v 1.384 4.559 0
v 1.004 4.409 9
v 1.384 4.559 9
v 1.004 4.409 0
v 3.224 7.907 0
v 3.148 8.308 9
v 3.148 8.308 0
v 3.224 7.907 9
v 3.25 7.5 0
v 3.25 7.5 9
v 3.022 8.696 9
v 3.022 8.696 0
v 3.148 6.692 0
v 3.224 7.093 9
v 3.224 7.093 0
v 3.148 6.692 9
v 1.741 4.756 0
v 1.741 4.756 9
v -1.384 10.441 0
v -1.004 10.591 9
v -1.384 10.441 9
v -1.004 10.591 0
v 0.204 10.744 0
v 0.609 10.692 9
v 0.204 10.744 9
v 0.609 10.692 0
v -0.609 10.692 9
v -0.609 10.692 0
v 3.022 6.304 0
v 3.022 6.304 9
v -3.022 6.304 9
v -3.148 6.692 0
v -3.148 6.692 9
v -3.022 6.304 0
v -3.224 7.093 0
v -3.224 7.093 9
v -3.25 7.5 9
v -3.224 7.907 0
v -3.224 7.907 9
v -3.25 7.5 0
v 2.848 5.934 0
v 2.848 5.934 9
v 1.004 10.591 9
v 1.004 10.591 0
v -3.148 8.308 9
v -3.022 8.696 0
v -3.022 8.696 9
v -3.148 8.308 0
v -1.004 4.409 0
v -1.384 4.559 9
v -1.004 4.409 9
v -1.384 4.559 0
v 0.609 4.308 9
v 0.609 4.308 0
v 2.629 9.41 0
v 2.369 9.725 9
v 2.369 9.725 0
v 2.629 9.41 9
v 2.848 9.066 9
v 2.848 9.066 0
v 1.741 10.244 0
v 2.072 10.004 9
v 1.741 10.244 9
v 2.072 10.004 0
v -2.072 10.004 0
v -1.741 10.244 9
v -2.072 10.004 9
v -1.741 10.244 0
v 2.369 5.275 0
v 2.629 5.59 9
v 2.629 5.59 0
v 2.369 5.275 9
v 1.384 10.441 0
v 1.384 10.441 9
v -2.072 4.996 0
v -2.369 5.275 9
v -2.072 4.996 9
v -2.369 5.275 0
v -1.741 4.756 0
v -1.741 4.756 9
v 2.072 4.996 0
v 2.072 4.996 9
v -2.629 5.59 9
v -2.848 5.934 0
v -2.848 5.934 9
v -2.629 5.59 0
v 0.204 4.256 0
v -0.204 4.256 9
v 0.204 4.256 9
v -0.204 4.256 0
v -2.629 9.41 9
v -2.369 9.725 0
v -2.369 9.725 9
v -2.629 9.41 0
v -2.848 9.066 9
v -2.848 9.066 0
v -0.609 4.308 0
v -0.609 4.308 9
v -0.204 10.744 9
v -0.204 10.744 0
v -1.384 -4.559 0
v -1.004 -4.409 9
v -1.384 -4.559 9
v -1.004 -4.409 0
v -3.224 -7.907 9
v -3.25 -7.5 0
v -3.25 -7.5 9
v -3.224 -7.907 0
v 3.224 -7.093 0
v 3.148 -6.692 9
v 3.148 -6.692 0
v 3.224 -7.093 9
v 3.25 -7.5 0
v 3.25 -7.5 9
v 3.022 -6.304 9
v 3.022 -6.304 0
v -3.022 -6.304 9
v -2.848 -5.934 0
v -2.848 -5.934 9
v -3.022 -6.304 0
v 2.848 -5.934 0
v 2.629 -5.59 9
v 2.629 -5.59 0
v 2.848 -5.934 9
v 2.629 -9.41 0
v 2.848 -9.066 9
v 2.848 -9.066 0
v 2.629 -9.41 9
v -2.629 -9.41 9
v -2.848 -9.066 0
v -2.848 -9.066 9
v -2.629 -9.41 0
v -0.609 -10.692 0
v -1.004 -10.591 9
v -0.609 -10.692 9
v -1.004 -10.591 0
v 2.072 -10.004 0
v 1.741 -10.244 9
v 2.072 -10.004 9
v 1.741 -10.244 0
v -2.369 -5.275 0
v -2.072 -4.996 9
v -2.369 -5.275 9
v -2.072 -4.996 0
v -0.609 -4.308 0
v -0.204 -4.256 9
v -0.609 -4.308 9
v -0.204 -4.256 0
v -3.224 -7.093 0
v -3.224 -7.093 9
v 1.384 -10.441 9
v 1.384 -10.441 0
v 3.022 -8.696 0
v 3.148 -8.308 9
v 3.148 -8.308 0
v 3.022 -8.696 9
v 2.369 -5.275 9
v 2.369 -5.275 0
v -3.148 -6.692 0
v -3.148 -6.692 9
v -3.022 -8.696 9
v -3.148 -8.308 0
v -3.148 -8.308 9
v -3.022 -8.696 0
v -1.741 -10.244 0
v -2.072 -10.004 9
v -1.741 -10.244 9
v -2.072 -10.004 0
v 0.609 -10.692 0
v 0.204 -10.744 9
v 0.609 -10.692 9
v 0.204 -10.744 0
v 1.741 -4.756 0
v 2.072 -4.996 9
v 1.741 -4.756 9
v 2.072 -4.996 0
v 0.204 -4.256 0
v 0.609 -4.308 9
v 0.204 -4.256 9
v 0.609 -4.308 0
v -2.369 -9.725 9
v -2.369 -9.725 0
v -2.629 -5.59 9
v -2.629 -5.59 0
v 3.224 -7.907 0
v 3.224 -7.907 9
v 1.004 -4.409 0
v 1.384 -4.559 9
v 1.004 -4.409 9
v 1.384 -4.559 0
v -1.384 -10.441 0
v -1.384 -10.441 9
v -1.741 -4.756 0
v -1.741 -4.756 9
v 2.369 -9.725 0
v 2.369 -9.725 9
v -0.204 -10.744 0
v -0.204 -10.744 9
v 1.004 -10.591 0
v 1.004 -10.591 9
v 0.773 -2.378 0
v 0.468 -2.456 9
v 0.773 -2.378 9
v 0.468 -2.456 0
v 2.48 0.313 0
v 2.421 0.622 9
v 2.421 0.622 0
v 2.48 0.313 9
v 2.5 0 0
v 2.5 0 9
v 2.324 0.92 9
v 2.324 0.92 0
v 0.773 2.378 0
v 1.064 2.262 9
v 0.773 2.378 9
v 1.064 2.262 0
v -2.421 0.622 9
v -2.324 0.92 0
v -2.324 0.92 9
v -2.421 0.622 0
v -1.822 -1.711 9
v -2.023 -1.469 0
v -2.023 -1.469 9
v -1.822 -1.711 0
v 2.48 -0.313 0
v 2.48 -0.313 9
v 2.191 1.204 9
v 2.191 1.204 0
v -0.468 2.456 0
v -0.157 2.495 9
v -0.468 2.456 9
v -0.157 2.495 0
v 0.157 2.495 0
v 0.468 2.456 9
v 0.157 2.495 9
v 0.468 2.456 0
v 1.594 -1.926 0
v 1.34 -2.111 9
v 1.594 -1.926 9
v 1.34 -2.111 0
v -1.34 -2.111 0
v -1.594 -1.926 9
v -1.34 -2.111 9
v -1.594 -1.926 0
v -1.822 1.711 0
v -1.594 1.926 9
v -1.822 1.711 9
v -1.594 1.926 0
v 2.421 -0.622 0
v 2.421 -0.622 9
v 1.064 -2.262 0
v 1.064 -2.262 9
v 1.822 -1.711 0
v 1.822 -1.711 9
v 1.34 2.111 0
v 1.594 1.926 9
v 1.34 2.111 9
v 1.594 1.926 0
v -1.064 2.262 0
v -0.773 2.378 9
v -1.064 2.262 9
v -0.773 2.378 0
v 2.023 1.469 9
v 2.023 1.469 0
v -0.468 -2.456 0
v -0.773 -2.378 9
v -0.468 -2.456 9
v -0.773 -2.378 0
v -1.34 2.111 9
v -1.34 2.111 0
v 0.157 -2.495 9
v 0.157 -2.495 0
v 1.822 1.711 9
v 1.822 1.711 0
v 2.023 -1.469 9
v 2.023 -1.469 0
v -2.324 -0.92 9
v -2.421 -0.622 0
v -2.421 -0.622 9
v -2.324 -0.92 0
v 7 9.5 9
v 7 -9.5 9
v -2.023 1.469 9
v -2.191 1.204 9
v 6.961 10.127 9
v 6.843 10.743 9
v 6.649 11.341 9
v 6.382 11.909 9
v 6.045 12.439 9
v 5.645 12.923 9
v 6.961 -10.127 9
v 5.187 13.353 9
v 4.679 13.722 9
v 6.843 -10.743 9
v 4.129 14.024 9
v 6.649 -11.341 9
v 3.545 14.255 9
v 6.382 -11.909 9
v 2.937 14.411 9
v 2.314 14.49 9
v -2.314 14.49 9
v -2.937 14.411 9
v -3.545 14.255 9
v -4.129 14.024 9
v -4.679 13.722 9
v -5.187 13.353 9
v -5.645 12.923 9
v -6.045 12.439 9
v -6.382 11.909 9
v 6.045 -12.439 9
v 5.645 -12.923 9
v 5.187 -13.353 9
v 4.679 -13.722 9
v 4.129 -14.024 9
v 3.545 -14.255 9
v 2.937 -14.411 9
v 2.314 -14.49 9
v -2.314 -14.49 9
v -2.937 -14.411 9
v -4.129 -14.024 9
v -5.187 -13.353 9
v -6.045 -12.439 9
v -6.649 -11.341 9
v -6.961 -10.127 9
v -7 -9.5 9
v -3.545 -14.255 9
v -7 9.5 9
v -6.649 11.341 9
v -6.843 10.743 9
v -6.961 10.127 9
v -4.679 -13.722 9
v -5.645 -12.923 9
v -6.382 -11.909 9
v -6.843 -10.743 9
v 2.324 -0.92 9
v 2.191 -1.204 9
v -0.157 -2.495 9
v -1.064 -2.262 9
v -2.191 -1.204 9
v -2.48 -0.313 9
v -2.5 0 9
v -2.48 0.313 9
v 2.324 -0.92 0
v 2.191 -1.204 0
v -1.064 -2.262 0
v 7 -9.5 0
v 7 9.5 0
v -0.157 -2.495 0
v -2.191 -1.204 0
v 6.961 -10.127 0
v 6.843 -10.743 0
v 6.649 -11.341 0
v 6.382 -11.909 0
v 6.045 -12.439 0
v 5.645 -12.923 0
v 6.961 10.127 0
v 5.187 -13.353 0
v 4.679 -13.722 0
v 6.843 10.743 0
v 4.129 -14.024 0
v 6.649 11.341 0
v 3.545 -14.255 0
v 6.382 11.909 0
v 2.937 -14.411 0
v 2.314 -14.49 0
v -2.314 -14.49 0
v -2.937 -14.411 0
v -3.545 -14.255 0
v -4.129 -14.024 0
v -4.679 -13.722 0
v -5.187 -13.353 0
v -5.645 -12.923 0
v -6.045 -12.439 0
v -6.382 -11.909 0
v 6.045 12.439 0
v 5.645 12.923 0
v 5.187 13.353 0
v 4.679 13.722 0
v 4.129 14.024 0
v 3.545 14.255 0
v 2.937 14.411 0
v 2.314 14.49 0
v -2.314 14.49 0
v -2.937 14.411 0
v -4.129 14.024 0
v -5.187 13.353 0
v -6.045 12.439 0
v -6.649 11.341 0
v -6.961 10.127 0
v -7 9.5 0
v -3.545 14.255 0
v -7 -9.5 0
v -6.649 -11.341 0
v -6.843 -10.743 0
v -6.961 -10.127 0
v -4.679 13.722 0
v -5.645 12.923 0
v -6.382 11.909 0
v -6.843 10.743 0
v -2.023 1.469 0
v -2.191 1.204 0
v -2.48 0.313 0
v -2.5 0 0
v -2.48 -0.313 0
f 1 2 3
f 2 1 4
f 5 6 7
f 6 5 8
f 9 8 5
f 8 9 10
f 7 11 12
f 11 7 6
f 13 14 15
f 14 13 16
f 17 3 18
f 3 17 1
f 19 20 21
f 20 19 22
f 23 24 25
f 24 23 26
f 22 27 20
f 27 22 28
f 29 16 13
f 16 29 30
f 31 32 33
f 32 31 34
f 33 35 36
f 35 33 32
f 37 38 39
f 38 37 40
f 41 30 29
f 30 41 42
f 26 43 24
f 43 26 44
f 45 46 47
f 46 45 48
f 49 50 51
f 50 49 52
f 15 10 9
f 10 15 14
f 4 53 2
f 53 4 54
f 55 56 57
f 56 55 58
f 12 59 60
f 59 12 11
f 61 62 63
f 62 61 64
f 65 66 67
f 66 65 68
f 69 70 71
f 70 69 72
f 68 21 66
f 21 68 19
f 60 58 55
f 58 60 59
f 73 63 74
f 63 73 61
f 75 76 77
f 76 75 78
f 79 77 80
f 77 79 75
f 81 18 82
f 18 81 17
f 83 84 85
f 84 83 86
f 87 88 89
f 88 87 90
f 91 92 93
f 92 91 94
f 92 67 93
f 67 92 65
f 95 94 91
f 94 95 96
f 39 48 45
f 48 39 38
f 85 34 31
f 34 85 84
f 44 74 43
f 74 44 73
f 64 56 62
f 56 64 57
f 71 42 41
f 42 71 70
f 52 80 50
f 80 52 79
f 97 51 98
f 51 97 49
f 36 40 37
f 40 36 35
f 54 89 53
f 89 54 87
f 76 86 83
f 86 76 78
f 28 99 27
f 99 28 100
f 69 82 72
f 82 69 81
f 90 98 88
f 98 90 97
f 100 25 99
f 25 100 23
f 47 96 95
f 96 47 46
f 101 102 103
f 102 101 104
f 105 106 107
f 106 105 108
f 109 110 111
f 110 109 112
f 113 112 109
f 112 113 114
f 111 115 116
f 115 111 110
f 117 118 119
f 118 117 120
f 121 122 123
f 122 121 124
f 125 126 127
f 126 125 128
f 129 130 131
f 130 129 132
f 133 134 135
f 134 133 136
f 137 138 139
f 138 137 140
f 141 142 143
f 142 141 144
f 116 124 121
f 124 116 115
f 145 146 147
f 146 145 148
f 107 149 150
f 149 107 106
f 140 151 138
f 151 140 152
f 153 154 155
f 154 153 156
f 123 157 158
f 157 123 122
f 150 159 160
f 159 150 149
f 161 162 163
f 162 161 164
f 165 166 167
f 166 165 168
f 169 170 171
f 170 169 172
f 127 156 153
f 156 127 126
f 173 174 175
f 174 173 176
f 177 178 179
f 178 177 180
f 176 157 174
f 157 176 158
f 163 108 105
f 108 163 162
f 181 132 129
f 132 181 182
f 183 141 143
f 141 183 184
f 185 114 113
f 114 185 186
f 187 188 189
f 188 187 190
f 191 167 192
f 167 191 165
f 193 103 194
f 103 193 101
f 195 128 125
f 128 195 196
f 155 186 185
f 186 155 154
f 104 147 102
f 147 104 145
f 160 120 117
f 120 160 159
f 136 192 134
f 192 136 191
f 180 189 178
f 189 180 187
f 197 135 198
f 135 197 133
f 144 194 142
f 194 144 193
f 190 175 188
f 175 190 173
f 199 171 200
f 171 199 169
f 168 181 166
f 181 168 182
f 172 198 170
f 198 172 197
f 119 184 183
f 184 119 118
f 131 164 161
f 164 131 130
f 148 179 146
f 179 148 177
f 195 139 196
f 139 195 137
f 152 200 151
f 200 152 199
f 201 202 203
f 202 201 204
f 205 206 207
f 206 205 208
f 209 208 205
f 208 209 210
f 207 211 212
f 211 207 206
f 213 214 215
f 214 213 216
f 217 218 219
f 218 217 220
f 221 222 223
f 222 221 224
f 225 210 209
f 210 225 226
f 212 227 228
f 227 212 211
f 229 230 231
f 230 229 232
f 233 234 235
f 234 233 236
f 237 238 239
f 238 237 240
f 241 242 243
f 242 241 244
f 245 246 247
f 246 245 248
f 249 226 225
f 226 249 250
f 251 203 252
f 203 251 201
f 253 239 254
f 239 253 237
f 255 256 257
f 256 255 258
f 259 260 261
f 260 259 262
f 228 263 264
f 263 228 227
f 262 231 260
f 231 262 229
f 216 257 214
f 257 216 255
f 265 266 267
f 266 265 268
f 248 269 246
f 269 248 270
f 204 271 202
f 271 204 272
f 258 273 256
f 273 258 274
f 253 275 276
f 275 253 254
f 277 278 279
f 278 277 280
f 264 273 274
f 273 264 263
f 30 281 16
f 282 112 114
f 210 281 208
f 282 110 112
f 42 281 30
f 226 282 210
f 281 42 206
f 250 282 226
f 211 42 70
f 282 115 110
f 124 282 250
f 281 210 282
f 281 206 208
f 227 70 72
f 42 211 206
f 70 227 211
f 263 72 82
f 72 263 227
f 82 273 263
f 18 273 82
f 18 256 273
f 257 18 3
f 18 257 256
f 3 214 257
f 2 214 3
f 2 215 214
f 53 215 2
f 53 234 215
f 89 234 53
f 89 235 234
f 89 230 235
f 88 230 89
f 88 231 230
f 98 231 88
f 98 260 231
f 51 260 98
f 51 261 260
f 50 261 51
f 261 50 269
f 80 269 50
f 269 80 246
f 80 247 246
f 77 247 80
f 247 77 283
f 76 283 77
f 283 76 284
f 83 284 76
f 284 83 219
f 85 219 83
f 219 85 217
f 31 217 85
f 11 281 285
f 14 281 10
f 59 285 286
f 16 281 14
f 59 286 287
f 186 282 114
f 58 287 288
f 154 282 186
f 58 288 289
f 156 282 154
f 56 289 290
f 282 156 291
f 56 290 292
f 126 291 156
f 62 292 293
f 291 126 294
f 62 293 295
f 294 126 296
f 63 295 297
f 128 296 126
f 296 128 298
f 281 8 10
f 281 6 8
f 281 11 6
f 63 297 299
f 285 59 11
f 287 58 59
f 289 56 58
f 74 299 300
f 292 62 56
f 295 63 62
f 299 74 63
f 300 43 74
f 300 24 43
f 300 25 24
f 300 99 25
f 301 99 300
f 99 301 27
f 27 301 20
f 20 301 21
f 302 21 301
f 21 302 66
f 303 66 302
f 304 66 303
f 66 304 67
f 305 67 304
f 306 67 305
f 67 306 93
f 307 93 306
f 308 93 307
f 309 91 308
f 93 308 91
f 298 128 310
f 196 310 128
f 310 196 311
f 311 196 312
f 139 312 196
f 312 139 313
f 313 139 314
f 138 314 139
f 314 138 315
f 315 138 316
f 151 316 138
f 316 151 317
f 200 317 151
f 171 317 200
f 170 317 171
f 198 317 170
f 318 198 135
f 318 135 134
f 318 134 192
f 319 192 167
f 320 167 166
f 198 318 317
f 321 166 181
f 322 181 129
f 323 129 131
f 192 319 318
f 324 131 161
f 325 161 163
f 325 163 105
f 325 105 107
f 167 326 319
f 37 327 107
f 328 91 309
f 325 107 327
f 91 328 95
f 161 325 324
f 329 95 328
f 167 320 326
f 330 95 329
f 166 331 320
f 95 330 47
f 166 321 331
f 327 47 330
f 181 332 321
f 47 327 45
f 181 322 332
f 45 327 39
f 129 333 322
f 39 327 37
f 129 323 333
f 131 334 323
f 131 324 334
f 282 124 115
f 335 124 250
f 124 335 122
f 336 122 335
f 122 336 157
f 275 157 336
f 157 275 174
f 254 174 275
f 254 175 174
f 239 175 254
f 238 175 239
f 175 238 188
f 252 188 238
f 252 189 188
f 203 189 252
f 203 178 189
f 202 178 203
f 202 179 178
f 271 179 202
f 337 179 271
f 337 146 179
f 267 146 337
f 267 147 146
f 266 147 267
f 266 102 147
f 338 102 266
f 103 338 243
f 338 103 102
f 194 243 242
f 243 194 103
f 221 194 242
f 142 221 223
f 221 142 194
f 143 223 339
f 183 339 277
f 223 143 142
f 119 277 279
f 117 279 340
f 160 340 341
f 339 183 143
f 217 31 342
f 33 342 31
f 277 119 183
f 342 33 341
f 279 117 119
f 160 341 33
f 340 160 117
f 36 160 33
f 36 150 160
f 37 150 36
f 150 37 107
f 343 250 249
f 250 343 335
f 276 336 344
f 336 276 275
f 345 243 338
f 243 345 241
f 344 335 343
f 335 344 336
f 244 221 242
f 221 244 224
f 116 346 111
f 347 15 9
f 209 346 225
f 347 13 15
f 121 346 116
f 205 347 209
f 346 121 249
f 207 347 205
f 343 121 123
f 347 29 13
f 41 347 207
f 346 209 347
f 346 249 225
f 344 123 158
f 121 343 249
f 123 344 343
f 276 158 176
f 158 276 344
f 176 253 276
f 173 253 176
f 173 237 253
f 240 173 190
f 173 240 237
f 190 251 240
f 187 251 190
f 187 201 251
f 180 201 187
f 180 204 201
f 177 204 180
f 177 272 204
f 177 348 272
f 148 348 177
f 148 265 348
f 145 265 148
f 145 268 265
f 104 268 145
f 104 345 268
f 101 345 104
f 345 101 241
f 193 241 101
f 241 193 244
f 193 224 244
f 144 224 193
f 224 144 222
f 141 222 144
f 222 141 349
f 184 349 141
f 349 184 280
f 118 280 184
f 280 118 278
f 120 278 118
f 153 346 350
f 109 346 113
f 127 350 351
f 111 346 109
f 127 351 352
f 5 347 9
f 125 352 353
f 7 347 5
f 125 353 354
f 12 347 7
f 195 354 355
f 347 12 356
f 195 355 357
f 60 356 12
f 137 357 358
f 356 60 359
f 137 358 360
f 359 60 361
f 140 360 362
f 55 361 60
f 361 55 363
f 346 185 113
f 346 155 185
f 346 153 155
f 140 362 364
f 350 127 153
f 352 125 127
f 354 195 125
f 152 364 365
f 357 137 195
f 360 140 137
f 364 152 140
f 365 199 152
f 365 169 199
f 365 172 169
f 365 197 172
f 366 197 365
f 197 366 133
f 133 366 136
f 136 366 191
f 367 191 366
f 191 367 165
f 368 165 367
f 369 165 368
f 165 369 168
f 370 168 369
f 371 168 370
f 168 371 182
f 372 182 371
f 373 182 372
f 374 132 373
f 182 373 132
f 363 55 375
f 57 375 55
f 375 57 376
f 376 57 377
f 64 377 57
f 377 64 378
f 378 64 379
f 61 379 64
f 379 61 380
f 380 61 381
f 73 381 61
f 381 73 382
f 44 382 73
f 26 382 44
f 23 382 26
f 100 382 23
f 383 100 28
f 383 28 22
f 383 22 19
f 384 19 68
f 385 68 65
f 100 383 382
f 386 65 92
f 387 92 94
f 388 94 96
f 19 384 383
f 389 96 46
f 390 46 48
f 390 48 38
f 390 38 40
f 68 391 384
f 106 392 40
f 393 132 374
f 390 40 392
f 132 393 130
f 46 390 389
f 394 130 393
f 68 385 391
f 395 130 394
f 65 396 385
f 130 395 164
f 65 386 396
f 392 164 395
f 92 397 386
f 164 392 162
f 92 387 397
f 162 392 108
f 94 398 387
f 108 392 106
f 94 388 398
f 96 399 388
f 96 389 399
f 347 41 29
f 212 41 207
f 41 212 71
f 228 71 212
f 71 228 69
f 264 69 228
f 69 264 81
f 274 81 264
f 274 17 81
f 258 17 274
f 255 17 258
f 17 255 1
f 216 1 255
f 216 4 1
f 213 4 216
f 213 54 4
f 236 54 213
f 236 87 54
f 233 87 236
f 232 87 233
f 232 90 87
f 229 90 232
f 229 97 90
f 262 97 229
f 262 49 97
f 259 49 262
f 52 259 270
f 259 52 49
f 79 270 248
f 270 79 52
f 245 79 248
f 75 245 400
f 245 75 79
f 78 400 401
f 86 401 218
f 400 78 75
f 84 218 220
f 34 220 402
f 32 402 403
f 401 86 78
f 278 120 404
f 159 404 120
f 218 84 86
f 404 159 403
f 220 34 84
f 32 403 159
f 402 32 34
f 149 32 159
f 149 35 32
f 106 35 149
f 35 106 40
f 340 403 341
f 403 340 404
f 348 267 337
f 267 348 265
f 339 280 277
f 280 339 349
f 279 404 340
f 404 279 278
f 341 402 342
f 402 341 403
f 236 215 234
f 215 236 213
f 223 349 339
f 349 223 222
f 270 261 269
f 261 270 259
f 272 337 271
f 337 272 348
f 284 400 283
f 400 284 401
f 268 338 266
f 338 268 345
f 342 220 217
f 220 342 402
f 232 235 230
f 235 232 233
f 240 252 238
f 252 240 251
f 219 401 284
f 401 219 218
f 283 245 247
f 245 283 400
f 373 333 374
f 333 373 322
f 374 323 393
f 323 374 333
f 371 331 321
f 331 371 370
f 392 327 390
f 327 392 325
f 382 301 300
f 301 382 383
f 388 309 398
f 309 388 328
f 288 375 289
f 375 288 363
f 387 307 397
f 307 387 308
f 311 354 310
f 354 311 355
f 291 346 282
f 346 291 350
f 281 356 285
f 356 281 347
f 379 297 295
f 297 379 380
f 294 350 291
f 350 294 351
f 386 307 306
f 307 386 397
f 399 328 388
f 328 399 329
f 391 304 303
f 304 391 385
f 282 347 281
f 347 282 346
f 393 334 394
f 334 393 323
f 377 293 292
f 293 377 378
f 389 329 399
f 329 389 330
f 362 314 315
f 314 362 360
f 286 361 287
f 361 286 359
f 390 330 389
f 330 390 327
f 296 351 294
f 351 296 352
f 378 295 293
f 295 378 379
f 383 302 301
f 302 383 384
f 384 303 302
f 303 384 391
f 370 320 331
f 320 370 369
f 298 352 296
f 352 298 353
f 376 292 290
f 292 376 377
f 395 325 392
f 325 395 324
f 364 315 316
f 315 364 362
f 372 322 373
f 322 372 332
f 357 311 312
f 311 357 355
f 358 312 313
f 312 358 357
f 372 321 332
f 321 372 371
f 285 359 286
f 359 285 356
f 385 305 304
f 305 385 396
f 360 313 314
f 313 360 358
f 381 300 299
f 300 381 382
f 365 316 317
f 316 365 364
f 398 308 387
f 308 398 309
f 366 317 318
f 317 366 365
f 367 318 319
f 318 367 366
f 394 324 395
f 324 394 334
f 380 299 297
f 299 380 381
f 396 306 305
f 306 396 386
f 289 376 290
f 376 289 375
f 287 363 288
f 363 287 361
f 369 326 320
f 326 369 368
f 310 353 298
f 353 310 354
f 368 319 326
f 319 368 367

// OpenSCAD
$fn = 50;


difference() {
	union() {
		hull() {
			translate(v = [-2.0000000000, 9.5000000000, 0]) {
				cylinder(h = 9, r = 5);
			}
			translate(v = [2.0000000000, 9.5000000000, 0]) {
				cylinder(h = 9, r = 5);
			}
			translate(v = [-2.0000000000, -9.5000000000, 0]) {
				cylinder(h = 9, r = 5);
			}
			translate(v = [2.0000000000, -9.5000000000, 0]) {
				cylinder(h = 9, r = 5);
			}
		}
	}
	union() {
		#translate(v = [0.0000000000, 7.5000000000, 0]) {
			cylinder(h = 9, r = 3.2500000000);
		}
		#translate(v = [0.0000000000, -7.5000000000, 0]) {
			cylinder(h = 9, r = 3.2500000000);
		}
		#translate(v = [0.0000000000, -7.5000000000, -100.0000000000]) {
			cylinder(h = 200, r = 3.2500000000);
		}
		#translate(v = [0.0000000000, -7.5000000000, -100.0000000000]) {
			cylinder(h = 200, r = 3.2500000000);
		}
		#translate(v = [0.0000000000, 7.5000000000, -100.0000000000]) {
			cylinder(h = 200, r = 3.2500000000);
		}
		#translate(v = [0.0000000000, 7.5000000000, -100.0000000000]) {
			cylinder(h = 200, r = 3.2500000000);
		}
		#translate(v = [0.0000000000, 7.5000000000, 0]) {
			cylinder(h = 9, r = 1.8000000000);
		}
		#translate(v = [0.0000000000, -7.5000000000, 0]) {
			cylinder(h = 9, r = 1.8000000000);
		}
		#translate(v = [0.0000000000, 7.5000000000, 0]) {
			cylinder(h = 9, r = 1.8000000000);
		}
		#translate(v = [0.0000000000, -7.5000000000, 0]) {
			cylinder(h = 9, r = 1.8000000000);
		}
		#translate(v = [0.0000000000, 7.5000000000, 0]) {
			cylinder(h = 9, r = 1.8000000000);
		}
		#translate(v = [0.0000000000, -7.5000000000, 0]) {
			cylinder(h = 9, r = 1.8000000000);
		}
		#cylinder(h = 9, r = 2.5000000000);
	}
}
